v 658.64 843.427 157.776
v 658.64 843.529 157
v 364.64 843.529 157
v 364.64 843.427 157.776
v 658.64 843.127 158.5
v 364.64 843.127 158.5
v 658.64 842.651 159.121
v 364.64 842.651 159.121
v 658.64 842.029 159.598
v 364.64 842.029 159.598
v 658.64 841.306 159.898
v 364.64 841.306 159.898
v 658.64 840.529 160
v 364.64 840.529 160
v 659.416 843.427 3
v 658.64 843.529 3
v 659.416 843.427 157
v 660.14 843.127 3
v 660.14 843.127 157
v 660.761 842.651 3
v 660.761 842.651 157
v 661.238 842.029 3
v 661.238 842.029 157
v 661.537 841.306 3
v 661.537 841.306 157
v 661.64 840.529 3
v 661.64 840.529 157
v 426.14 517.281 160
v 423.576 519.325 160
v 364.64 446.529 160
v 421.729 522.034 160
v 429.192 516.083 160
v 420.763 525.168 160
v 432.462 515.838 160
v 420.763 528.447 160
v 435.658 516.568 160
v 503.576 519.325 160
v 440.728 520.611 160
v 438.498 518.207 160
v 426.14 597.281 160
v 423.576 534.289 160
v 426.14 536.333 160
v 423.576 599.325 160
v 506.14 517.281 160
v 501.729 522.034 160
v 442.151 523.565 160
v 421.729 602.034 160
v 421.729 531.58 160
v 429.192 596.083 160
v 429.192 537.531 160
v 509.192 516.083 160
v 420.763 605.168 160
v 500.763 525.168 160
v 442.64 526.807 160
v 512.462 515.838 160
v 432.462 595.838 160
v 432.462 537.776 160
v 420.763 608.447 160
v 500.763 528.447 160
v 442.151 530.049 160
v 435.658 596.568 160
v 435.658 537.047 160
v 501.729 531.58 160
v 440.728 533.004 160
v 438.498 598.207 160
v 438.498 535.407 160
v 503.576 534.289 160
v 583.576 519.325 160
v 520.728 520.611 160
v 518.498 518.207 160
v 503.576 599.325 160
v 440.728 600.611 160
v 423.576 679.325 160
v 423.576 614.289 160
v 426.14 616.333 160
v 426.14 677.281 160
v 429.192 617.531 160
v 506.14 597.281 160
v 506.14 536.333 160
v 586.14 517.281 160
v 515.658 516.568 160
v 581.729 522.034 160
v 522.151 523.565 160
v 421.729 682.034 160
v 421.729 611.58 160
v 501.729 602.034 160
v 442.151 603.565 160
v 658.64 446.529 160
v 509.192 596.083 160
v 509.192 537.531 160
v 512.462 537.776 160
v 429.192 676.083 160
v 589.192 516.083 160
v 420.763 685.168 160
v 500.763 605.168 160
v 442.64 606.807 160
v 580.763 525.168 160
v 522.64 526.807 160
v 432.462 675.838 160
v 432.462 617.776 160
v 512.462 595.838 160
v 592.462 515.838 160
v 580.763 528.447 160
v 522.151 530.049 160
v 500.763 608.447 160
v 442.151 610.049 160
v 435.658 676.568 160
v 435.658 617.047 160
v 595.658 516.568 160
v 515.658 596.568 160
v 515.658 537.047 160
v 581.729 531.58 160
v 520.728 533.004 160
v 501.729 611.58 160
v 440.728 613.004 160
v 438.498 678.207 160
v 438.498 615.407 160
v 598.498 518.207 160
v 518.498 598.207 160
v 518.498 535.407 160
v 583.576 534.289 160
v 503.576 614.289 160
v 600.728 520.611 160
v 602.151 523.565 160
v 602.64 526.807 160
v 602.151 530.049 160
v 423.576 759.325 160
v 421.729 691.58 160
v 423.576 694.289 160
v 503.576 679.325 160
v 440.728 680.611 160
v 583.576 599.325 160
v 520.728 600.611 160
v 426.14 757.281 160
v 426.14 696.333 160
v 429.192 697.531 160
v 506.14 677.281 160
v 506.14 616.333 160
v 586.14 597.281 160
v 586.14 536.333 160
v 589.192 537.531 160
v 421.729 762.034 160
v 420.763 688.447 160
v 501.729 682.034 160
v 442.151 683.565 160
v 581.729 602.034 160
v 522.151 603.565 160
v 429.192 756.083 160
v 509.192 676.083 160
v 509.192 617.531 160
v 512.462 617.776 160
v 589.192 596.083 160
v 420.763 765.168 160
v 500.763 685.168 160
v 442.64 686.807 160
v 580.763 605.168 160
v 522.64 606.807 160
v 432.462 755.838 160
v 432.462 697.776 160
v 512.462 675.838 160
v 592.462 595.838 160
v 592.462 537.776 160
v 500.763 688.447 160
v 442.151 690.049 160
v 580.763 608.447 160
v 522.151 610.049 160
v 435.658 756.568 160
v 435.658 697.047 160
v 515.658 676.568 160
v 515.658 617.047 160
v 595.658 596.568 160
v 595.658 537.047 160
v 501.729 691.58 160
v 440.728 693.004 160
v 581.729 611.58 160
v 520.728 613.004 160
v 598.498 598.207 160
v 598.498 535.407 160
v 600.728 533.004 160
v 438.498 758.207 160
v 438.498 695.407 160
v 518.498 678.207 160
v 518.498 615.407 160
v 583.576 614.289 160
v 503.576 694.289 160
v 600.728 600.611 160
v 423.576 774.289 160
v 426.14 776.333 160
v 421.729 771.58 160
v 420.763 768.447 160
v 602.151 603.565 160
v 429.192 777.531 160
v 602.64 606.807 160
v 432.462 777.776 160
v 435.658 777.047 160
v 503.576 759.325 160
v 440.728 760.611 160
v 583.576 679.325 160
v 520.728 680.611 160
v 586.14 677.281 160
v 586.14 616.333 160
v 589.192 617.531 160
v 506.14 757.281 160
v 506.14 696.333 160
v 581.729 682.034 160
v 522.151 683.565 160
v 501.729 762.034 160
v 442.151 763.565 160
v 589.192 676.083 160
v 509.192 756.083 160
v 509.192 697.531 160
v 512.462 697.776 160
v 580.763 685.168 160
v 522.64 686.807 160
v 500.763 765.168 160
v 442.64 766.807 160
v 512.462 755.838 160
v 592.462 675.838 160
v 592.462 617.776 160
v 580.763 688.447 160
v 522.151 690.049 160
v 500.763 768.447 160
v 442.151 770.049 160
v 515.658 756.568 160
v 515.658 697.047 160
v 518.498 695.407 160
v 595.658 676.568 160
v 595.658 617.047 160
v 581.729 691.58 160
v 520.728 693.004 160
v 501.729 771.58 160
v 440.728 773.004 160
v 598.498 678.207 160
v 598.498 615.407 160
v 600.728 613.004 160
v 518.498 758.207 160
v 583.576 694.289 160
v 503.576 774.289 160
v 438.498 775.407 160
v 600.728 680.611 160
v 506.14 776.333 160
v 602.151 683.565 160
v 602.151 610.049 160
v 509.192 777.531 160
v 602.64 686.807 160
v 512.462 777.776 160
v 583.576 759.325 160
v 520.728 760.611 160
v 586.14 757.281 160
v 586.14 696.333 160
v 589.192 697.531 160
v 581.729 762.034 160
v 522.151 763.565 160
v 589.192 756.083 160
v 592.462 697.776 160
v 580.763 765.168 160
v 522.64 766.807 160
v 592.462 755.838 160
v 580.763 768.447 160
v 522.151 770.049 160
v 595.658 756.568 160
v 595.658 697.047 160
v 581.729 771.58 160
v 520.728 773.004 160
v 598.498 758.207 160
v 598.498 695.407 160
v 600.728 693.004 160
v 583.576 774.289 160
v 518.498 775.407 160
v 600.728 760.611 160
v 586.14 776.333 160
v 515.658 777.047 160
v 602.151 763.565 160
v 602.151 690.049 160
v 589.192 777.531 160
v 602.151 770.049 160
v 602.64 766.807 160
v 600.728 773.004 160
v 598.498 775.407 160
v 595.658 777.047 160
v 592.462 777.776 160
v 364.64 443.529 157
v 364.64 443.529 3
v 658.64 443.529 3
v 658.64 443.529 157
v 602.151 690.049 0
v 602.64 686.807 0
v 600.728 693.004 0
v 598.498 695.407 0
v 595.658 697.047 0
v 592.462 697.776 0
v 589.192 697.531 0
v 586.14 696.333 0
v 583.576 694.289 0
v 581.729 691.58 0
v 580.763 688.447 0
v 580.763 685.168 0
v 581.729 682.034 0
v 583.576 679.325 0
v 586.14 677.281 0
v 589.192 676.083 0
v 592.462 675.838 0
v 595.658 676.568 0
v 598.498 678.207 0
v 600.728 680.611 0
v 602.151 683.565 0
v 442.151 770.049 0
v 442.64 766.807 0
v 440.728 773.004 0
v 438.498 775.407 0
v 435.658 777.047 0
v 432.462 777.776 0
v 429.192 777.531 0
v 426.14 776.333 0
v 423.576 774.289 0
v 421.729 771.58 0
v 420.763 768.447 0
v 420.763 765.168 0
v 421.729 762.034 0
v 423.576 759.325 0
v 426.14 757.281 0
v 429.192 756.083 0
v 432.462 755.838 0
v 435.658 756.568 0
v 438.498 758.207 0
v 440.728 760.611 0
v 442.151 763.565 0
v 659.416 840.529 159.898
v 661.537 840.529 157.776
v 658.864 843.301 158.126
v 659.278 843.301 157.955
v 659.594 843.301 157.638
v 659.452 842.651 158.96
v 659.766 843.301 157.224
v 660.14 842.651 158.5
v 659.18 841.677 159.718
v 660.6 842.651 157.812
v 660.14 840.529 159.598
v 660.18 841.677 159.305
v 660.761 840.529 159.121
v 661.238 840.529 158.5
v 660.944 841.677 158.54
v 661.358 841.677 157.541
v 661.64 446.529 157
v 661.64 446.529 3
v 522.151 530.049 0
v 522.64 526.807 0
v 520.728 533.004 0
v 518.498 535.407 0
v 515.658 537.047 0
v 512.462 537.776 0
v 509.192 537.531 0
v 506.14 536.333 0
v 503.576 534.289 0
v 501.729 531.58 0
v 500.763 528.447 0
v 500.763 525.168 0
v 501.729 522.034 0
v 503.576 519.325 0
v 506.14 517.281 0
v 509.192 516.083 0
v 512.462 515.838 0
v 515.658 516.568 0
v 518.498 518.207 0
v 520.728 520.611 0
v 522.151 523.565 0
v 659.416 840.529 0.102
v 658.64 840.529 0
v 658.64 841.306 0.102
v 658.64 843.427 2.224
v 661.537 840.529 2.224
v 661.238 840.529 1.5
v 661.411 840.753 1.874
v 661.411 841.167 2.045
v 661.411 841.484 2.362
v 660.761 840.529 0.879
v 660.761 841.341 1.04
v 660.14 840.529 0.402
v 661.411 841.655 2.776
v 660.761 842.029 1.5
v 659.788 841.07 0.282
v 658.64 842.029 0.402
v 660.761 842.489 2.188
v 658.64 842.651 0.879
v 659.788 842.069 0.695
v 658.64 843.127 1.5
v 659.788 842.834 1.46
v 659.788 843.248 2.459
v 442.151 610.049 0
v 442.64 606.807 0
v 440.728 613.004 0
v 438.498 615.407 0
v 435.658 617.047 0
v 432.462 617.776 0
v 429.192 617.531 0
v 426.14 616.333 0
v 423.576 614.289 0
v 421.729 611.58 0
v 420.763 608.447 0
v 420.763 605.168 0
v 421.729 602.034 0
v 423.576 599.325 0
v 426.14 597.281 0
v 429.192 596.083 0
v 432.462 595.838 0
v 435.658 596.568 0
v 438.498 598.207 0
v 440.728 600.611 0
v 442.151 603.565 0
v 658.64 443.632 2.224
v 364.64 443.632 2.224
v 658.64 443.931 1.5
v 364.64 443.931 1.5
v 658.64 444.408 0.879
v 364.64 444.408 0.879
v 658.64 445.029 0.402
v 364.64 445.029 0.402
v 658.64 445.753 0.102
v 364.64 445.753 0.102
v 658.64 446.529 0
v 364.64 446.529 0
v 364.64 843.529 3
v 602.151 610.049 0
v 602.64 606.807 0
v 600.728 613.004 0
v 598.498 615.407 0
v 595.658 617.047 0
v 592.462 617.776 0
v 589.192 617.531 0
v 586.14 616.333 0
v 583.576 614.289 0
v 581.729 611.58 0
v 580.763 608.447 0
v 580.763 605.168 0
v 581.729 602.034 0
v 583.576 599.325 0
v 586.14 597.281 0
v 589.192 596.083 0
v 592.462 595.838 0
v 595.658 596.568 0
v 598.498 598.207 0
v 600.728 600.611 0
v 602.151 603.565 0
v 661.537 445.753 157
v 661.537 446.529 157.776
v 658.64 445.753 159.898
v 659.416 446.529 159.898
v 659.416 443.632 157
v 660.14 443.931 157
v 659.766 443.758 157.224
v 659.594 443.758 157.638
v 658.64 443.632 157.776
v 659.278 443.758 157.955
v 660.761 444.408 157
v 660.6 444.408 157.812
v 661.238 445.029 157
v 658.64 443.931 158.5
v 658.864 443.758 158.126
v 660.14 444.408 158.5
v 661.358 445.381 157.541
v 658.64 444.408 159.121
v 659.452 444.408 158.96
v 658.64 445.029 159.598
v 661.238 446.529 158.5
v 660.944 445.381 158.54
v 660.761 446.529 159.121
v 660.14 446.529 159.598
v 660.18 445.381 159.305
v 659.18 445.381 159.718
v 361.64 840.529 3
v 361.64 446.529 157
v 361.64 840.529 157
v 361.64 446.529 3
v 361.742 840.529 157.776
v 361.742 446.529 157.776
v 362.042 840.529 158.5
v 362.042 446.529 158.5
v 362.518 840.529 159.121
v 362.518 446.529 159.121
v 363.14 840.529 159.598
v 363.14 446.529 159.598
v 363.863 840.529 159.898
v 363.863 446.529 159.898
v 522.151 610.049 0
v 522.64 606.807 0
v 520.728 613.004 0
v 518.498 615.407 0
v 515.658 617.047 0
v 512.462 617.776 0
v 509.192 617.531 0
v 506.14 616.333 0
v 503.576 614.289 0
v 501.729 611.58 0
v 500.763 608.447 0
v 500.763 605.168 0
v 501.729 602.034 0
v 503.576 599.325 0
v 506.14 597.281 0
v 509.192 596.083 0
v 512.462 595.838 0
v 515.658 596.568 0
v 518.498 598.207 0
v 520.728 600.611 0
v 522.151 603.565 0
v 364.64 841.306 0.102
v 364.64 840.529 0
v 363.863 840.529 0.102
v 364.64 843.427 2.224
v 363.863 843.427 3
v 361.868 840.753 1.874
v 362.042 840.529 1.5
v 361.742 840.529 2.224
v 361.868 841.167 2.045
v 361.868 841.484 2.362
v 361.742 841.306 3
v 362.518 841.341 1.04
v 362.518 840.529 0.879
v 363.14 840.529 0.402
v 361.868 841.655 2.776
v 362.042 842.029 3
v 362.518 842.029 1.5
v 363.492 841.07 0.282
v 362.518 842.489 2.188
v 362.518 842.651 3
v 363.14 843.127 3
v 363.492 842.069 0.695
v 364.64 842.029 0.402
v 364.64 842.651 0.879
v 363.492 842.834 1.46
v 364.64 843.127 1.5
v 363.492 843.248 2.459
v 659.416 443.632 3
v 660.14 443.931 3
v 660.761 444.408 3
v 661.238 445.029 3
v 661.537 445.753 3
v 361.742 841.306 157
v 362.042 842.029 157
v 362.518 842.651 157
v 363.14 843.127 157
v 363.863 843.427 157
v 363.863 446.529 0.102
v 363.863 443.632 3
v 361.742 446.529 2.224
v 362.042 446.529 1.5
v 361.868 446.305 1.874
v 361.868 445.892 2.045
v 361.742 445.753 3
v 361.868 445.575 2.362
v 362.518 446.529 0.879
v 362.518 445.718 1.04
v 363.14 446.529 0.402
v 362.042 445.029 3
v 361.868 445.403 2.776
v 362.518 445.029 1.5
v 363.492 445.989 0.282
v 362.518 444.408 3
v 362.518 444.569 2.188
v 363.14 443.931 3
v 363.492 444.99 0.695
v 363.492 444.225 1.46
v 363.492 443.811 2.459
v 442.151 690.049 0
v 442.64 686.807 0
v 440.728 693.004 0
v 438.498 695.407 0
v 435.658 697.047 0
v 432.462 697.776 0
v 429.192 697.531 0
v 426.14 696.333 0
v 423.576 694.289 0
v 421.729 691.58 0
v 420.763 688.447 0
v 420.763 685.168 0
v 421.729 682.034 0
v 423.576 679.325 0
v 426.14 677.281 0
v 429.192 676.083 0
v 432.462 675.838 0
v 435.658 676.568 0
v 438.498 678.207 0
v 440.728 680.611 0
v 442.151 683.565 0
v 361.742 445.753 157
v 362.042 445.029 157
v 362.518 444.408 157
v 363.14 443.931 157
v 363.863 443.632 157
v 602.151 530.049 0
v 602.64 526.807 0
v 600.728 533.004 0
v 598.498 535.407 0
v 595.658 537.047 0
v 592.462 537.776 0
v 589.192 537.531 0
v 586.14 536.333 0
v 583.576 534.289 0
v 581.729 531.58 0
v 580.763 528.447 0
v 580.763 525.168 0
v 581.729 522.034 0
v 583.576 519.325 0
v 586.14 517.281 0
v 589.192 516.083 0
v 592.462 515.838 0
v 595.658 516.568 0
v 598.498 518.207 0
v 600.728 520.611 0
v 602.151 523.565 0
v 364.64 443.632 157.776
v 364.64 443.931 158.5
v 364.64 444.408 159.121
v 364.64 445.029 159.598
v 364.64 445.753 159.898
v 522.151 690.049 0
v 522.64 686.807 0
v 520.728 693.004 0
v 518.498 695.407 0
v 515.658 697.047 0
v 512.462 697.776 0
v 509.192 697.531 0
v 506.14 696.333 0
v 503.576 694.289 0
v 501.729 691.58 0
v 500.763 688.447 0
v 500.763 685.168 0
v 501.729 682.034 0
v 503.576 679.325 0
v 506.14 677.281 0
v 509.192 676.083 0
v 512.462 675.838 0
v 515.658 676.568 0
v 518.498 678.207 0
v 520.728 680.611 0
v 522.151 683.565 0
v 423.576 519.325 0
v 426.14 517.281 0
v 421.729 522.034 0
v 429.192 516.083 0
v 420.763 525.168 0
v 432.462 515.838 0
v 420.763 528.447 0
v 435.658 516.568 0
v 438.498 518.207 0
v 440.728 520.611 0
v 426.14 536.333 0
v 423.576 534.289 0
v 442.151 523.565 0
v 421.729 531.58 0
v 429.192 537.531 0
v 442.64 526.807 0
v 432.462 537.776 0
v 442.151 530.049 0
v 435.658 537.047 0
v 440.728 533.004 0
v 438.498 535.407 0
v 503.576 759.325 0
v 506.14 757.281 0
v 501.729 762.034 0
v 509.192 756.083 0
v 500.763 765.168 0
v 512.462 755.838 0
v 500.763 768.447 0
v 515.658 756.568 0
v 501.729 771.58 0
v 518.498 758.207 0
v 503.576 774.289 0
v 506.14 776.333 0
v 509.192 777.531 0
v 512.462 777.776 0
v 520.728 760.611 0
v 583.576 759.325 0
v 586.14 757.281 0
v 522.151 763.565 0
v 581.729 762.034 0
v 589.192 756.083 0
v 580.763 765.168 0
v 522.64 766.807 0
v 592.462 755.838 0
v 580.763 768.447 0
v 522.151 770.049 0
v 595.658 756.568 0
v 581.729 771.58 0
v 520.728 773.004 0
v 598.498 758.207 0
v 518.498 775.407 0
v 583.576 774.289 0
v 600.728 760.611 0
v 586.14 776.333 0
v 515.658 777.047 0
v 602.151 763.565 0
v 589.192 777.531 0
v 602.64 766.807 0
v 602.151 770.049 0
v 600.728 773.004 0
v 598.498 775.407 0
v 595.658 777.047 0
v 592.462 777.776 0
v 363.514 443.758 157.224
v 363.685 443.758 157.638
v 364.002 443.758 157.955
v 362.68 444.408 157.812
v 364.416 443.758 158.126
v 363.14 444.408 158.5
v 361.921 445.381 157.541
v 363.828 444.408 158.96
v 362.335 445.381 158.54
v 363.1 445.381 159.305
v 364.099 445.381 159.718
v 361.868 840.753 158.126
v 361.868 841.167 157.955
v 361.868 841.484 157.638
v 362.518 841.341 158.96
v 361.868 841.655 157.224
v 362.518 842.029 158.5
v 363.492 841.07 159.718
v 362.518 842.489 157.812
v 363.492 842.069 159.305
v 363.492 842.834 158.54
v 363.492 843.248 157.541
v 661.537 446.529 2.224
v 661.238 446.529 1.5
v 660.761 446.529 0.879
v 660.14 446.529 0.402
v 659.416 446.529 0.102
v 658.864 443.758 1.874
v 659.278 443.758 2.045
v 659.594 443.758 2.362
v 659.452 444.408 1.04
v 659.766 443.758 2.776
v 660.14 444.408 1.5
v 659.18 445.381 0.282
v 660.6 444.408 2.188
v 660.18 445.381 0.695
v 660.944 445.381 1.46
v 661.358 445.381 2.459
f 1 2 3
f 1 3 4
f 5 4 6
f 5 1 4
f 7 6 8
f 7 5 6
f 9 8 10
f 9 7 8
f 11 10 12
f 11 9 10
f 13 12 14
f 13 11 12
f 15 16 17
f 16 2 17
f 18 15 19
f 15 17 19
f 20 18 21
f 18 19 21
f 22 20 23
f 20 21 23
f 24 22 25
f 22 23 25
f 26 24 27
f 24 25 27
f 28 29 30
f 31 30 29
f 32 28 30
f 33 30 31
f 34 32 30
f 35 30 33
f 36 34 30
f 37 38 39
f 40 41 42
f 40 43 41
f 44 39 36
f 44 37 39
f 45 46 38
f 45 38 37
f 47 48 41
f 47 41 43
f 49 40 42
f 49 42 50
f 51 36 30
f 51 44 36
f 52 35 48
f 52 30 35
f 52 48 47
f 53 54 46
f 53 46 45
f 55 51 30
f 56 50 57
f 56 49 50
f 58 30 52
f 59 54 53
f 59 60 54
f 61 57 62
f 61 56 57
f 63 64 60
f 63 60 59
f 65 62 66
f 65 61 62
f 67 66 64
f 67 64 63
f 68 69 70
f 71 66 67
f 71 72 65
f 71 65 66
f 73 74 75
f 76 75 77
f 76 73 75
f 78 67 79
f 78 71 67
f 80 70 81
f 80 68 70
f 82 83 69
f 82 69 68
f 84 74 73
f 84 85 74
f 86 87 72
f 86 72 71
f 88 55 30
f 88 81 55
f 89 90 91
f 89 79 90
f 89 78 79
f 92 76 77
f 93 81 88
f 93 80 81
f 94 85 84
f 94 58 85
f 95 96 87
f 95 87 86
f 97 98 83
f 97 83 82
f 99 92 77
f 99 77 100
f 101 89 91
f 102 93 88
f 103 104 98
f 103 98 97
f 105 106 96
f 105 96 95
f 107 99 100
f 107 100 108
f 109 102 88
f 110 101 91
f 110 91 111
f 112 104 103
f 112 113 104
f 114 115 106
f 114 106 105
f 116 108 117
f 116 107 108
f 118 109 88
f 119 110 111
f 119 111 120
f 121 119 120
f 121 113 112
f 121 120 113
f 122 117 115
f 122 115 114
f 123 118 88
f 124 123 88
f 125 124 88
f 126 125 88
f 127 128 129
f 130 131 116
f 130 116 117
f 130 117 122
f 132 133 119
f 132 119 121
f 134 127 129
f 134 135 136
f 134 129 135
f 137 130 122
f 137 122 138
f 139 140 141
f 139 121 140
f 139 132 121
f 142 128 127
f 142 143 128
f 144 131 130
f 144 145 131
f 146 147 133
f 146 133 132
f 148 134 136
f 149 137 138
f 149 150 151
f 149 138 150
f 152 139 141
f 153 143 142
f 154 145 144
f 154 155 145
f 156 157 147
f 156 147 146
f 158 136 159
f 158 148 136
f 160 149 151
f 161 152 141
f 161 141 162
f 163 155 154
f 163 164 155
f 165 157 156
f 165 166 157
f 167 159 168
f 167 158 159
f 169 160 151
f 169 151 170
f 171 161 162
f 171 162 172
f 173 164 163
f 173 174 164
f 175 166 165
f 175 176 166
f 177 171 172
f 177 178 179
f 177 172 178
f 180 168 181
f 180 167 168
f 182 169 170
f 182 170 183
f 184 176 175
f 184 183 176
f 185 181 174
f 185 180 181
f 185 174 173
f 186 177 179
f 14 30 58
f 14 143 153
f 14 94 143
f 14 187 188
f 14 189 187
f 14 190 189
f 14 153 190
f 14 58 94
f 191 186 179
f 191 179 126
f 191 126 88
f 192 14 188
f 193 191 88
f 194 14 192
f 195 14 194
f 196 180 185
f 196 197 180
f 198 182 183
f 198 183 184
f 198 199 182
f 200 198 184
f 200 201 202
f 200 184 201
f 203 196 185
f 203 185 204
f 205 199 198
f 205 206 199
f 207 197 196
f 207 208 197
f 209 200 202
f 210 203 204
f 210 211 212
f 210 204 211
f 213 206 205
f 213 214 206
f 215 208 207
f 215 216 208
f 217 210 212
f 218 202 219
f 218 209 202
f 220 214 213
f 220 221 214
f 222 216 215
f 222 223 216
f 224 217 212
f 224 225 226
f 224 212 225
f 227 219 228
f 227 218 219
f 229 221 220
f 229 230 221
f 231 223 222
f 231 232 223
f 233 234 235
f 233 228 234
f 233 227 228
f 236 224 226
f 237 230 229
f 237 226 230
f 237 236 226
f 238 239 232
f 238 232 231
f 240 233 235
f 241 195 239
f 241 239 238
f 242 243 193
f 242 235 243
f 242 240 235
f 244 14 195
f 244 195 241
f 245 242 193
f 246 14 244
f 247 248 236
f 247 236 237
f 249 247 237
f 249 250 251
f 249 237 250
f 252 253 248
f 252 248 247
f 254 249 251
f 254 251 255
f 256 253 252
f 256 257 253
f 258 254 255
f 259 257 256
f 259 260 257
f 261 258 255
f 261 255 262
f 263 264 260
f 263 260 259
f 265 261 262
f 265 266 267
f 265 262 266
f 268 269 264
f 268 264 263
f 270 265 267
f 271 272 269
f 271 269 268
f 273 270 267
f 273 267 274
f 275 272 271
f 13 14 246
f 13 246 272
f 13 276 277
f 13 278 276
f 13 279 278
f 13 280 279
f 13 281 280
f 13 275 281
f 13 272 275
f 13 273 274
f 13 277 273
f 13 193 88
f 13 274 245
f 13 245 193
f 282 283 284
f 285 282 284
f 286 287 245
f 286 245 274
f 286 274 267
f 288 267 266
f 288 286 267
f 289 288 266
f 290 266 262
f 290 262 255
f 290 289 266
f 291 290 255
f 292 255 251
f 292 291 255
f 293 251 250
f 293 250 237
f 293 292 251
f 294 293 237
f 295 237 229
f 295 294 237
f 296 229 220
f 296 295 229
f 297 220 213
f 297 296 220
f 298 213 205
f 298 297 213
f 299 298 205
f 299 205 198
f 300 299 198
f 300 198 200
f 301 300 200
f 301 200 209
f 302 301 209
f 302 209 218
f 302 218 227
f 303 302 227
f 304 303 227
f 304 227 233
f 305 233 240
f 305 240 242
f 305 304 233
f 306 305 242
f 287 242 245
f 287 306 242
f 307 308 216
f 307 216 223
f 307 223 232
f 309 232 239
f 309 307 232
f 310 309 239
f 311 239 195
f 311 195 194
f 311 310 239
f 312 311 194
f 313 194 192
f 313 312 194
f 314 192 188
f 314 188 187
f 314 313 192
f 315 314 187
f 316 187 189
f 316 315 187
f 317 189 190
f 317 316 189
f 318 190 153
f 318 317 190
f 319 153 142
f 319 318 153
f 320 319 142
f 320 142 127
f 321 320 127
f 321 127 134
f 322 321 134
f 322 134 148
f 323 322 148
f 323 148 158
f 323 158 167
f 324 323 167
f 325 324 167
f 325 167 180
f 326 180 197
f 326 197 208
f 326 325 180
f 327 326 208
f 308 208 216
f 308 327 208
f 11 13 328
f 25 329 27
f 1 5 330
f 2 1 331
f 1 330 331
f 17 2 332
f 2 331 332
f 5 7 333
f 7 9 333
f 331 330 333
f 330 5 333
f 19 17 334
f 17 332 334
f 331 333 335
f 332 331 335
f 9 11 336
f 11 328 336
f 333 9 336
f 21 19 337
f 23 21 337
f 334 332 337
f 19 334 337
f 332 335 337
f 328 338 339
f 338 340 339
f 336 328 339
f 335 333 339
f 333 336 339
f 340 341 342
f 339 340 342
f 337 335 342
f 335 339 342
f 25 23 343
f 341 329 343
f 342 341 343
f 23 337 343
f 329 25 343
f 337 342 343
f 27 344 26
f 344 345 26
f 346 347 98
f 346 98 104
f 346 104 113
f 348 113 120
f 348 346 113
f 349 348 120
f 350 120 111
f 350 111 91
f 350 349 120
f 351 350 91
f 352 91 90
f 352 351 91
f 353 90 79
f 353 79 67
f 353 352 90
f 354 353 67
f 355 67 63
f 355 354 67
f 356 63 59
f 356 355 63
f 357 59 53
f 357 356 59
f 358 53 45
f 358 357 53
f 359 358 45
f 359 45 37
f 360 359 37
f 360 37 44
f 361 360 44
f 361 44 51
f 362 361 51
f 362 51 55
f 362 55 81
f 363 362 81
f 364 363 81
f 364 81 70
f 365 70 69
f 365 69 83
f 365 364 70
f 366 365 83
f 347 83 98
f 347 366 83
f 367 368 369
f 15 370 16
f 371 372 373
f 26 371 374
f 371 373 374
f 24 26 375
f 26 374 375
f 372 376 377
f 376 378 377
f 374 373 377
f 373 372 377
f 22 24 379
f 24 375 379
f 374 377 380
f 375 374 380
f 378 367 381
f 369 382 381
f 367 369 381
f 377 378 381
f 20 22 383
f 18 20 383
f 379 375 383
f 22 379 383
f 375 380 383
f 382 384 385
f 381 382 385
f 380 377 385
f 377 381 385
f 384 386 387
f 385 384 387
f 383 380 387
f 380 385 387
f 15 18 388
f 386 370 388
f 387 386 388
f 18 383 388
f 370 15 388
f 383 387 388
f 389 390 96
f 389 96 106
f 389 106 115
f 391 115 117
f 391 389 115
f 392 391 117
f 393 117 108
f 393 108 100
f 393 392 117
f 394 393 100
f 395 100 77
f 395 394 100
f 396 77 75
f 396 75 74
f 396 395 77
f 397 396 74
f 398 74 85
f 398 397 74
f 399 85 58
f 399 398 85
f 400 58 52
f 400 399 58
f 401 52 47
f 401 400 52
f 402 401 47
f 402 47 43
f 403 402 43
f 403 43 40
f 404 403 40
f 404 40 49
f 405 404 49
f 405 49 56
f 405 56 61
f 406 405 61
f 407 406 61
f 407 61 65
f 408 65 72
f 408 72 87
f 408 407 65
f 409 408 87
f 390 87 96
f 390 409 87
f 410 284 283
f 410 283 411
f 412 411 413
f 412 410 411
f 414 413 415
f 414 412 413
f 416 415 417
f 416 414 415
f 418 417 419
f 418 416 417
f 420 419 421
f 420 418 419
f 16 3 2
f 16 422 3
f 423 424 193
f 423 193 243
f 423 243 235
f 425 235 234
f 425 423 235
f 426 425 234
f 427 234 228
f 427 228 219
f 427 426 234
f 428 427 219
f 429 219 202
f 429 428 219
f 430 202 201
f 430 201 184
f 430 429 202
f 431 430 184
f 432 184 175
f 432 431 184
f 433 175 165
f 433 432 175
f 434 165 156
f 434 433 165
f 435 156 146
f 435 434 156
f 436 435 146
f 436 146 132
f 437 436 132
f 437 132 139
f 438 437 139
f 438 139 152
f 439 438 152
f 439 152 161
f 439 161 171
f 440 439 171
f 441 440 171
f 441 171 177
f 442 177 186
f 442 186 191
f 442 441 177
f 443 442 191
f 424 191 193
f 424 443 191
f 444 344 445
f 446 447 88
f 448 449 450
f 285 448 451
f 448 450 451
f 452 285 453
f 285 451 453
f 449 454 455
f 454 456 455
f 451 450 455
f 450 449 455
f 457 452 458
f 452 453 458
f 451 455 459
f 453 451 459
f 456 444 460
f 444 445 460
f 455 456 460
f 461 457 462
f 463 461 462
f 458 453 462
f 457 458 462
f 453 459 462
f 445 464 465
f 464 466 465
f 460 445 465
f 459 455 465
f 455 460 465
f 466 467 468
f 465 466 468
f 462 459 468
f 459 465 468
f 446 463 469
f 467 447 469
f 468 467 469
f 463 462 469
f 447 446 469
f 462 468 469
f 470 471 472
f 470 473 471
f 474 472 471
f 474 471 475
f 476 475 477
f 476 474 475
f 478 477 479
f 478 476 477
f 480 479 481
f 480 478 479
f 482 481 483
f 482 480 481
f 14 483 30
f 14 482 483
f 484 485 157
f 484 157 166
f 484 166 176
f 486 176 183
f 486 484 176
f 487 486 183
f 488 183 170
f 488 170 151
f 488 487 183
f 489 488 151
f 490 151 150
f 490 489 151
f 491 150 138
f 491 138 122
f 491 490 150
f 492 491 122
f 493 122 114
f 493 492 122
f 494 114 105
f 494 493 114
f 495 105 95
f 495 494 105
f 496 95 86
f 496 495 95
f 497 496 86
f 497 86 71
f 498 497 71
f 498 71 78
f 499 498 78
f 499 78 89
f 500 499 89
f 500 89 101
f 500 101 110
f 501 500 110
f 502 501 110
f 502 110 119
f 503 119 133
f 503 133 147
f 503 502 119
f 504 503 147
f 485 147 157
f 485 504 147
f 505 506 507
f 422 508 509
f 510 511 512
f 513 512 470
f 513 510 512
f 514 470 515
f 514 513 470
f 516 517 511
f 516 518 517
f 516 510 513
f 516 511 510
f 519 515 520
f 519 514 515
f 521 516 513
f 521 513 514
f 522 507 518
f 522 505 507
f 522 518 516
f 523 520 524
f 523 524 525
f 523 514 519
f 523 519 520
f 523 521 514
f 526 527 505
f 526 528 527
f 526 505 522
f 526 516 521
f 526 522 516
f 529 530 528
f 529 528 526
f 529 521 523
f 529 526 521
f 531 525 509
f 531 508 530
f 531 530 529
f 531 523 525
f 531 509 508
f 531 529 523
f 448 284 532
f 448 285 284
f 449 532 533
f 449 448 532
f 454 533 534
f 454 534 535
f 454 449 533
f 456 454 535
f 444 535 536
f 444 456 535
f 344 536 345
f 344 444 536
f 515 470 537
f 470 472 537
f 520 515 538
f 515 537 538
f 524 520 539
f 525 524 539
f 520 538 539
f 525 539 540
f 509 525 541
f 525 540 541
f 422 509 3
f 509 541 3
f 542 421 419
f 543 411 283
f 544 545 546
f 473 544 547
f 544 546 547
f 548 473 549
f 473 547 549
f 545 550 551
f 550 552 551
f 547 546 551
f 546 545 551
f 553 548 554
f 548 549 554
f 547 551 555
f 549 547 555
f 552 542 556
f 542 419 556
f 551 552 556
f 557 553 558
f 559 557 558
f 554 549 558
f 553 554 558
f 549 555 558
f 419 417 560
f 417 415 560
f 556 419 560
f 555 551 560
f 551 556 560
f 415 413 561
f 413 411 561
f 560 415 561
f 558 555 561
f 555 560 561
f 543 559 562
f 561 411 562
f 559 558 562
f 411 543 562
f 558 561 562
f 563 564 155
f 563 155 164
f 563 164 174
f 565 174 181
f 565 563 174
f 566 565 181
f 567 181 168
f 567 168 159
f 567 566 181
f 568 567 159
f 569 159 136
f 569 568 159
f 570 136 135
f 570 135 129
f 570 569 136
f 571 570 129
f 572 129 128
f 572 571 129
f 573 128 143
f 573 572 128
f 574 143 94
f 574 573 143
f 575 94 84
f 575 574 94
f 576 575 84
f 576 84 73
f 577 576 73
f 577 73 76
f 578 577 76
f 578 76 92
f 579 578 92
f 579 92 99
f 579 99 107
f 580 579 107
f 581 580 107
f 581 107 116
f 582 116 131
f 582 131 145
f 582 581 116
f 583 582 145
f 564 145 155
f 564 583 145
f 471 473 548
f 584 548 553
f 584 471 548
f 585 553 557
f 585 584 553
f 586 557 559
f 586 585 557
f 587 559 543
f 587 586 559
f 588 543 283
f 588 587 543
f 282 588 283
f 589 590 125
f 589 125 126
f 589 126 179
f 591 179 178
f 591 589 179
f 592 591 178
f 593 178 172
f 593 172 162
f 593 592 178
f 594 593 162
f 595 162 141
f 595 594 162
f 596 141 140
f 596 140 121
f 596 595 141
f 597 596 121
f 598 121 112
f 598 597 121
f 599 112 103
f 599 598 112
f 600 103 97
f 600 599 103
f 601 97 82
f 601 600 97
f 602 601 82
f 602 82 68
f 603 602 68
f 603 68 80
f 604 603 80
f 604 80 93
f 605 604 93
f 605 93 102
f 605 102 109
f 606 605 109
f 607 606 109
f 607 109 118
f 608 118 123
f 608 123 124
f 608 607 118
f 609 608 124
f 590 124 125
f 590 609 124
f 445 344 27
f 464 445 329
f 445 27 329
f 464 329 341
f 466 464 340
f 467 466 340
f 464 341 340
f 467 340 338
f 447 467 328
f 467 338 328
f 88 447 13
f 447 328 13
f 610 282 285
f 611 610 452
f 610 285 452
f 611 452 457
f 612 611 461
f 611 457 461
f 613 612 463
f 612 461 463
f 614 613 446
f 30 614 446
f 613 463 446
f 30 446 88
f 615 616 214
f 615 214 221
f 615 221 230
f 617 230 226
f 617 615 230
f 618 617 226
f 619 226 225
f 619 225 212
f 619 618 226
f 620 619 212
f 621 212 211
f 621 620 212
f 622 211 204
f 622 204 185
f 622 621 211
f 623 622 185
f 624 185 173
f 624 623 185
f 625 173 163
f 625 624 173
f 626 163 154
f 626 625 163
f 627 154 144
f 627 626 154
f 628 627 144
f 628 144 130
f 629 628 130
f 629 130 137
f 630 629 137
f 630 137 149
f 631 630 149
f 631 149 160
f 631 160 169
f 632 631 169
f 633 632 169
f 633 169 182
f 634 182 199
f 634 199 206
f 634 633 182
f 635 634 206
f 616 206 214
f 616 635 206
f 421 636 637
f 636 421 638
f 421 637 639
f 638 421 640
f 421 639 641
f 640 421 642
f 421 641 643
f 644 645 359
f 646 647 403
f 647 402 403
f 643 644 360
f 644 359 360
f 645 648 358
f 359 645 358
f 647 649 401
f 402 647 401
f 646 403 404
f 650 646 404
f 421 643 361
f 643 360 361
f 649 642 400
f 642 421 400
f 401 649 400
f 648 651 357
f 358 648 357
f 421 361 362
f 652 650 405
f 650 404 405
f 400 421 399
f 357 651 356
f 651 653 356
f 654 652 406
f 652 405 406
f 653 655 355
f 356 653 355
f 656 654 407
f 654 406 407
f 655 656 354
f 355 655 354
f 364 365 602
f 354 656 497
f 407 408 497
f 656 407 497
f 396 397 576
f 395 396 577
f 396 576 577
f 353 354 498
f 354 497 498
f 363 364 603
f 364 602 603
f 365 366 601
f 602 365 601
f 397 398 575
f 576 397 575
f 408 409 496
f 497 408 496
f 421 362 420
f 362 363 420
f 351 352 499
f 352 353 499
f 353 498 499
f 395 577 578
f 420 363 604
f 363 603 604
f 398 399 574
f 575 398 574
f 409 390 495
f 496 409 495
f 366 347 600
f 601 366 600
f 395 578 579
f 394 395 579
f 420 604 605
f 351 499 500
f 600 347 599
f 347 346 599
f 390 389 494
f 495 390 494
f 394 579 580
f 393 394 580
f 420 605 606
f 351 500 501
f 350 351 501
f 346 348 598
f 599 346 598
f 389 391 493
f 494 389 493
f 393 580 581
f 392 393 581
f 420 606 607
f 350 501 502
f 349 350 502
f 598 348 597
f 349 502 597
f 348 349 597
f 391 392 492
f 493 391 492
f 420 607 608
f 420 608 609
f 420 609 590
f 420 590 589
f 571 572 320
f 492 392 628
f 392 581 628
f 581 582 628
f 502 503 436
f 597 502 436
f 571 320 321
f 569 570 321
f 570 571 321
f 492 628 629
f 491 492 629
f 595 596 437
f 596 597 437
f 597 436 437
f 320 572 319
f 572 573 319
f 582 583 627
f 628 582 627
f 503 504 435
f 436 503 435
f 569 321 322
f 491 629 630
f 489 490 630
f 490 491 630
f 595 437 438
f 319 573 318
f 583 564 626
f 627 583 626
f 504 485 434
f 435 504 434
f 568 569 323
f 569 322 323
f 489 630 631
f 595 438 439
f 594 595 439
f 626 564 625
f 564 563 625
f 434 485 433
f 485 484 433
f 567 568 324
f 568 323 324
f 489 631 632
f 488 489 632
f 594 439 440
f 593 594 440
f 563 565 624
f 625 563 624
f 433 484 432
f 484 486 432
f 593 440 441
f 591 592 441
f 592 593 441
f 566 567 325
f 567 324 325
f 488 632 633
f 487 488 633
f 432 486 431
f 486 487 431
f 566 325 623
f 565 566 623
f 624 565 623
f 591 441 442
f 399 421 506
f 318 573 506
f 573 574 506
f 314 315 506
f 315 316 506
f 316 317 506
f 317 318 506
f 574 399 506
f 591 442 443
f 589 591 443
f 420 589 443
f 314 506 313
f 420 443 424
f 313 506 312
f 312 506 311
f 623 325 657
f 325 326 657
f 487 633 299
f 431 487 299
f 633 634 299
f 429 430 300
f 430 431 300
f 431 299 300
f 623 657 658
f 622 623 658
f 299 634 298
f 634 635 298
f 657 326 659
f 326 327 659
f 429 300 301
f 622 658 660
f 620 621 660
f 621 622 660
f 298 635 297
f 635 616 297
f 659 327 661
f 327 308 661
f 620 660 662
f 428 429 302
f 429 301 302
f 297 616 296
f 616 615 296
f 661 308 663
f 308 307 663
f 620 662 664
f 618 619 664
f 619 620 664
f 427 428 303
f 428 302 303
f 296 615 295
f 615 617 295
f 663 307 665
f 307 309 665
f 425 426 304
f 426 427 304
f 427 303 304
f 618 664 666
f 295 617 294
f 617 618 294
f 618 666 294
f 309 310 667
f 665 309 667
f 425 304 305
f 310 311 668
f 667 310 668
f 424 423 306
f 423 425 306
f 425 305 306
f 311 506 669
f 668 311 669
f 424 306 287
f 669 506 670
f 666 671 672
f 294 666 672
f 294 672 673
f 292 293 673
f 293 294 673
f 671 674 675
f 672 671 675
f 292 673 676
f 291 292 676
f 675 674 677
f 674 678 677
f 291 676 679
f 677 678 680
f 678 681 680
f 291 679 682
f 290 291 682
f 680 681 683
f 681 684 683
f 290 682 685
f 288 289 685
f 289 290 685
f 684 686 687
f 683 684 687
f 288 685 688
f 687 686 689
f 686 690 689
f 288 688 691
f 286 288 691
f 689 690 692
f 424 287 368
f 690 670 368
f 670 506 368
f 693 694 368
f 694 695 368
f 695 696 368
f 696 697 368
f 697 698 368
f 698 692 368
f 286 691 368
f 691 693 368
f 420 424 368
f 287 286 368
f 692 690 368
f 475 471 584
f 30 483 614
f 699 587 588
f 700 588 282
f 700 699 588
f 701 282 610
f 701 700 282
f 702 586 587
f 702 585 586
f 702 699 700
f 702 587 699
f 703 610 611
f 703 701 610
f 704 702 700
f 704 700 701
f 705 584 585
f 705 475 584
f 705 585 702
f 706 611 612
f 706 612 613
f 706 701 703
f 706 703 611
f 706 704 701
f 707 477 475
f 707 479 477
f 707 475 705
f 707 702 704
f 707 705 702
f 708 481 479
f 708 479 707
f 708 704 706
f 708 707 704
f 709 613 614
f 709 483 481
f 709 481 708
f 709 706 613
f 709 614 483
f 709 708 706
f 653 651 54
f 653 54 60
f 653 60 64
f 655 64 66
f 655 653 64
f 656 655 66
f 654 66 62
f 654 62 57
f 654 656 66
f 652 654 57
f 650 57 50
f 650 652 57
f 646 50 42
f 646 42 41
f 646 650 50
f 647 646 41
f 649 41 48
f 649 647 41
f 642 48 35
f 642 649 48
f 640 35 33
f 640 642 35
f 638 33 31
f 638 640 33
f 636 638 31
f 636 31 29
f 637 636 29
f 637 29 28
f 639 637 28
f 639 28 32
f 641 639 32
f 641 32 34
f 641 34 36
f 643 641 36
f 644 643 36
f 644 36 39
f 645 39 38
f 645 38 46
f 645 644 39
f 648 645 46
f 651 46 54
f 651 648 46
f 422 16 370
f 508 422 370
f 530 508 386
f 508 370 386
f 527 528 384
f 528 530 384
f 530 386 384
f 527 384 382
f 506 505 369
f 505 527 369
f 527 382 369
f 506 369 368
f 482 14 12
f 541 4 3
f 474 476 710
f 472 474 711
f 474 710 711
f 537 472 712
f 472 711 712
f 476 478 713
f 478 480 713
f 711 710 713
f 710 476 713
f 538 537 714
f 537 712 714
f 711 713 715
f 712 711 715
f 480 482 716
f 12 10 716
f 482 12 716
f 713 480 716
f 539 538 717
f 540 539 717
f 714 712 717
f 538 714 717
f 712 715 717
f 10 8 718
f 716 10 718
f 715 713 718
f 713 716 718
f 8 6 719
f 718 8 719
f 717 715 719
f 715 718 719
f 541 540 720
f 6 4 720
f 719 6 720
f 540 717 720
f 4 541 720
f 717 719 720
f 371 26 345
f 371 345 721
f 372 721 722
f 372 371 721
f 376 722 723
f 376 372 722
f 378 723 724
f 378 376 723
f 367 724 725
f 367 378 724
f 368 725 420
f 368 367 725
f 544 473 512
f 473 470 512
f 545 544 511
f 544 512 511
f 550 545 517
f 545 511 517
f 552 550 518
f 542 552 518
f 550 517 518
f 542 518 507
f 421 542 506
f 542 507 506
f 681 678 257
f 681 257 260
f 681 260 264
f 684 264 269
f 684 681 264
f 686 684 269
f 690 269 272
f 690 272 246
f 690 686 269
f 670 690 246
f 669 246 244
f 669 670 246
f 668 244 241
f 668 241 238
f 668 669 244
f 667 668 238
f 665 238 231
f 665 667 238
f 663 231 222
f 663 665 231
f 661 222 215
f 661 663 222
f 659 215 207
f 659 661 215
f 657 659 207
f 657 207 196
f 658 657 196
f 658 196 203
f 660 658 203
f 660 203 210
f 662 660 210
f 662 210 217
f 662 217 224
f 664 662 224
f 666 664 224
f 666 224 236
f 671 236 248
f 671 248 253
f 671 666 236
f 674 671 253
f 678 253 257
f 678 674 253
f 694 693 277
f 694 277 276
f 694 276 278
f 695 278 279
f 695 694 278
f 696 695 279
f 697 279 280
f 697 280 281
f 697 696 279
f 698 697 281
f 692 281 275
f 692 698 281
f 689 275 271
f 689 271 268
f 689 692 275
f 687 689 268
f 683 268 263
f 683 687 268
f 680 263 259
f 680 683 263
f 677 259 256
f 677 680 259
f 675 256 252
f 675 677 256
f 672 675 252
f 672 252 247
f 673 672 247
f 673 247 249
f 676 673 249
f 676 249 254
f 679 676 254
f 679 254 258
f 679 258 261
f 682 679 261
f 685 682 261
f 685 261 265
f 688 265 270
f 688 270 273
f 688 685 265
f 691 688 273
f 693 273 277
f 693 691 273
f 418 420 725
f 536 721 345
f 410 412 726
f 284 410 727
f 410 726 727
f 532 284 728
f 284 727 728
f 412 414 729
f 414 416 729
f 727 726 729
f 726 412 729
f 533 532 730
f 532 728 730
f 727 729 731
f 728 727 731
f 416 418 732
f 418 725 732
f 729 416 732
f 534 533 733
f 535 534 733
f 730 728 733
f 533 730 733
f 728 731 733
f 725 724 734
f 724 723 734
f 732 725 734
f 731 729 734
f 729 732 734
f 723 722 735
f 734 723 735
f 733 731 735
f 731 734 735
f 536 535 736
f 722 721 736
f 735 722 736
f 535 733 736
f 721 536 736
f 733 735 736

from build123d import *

# Parameters (mm, degrees)
SKETCH1_W           = 300
SKETCH1_H           = 400
SKETCH1_R           = 11
BOSS_EXTRUDE1_DEPTH = 160
FILLET1_R           = 3


with BuildPart() as part:
    # Sketch1 → Boss-Extrude1 (new body)
    with BuildSketch(Plane.XY):
        with Locations((511.639721418, 643.529340403)):
            Rectangle(SKETCH1_W, SKETCH1_H)
        with Locations((431.639721418, 526.80715456)):
            Circle(SKETCH1_R, mode=Mode.SUBTRACT)
        with Locations((431.639721418, 606.80715456)):
            Circle(SKETCH1_R, mode=Mode.SUBTRACT)
        with Locations((431.639721418, 686.80715456)):
            Circle(SKETCH1_R, mode=Mode.SUBTRACT)
        with Locations((431.639721418, 766.80715456)):
            Circle(SKETCH1_R, mode=Mode.SUBTRACT)
        with Locations((511.639721418, 526.80715456)):
            Circle(SKETCH1_R, mode=Mode.SUBTRACT)
        with Locations((511.639721418, 606.80715456)):
            Circle(SKETCH1_R, mode=Mode.SUBTRACT)
        with Locations((511.639721418, 686.80715456)):
            Circle(SKETCH1_R, mode=Mode.SUBTRACT)
        with Locations((511.639721418, 766.80715456)):
            Circle(SKETCH1_R, mode=Mode.SUBTRACT)
        with Locations((591.639721418, 526.80715456)):
            Circle(SKETCH1_R, mode=Mode.SUBTRACT)
        with Locations((591.639721418, 606.80715456)):
            Circle(SKETCH1_R, mode=Mode.SUBTRACT)
        with Locations((591.639721418, 686.80715456)):
            Circle(SKETCH1_R, mode=Mode.SUBTRACT)
        with Locations((591.639721418, 766.80715456)):
            Circle(SKETCH1_R, mode=Mode.SUBTRACT)
    extrude(amount=BOSS_EXTRUDE1_DEPTH)

    # Fillet1
    fillet1_edges = [part.edges().sort_by_distance(p)[0] for p in [
        (661.639721418, 643.529340403, 160),
        (511.639721418, 843.529340403, 160),
        (361.639721418, 643.529340403, 160),
        (511.639721418, 843.529340403, 0),
        (661.639721418, 643.529340403, 0),
        (511.639721418, 443.529340403, 0),
        (361.639721418, 643.529340403, 0),
        (361.639721418, 843.529340403, 80),
        (661.639721418, 843.529340403, 80),
        (661.639721418, 443.529340403, 80),
        (361.639721418, 443.529340403, 80),
        (511.639721418, 443.529340403, 160),
    ]]
    fillet(fillet1_edges, radius=FILLET1_R)


solid = part.part
